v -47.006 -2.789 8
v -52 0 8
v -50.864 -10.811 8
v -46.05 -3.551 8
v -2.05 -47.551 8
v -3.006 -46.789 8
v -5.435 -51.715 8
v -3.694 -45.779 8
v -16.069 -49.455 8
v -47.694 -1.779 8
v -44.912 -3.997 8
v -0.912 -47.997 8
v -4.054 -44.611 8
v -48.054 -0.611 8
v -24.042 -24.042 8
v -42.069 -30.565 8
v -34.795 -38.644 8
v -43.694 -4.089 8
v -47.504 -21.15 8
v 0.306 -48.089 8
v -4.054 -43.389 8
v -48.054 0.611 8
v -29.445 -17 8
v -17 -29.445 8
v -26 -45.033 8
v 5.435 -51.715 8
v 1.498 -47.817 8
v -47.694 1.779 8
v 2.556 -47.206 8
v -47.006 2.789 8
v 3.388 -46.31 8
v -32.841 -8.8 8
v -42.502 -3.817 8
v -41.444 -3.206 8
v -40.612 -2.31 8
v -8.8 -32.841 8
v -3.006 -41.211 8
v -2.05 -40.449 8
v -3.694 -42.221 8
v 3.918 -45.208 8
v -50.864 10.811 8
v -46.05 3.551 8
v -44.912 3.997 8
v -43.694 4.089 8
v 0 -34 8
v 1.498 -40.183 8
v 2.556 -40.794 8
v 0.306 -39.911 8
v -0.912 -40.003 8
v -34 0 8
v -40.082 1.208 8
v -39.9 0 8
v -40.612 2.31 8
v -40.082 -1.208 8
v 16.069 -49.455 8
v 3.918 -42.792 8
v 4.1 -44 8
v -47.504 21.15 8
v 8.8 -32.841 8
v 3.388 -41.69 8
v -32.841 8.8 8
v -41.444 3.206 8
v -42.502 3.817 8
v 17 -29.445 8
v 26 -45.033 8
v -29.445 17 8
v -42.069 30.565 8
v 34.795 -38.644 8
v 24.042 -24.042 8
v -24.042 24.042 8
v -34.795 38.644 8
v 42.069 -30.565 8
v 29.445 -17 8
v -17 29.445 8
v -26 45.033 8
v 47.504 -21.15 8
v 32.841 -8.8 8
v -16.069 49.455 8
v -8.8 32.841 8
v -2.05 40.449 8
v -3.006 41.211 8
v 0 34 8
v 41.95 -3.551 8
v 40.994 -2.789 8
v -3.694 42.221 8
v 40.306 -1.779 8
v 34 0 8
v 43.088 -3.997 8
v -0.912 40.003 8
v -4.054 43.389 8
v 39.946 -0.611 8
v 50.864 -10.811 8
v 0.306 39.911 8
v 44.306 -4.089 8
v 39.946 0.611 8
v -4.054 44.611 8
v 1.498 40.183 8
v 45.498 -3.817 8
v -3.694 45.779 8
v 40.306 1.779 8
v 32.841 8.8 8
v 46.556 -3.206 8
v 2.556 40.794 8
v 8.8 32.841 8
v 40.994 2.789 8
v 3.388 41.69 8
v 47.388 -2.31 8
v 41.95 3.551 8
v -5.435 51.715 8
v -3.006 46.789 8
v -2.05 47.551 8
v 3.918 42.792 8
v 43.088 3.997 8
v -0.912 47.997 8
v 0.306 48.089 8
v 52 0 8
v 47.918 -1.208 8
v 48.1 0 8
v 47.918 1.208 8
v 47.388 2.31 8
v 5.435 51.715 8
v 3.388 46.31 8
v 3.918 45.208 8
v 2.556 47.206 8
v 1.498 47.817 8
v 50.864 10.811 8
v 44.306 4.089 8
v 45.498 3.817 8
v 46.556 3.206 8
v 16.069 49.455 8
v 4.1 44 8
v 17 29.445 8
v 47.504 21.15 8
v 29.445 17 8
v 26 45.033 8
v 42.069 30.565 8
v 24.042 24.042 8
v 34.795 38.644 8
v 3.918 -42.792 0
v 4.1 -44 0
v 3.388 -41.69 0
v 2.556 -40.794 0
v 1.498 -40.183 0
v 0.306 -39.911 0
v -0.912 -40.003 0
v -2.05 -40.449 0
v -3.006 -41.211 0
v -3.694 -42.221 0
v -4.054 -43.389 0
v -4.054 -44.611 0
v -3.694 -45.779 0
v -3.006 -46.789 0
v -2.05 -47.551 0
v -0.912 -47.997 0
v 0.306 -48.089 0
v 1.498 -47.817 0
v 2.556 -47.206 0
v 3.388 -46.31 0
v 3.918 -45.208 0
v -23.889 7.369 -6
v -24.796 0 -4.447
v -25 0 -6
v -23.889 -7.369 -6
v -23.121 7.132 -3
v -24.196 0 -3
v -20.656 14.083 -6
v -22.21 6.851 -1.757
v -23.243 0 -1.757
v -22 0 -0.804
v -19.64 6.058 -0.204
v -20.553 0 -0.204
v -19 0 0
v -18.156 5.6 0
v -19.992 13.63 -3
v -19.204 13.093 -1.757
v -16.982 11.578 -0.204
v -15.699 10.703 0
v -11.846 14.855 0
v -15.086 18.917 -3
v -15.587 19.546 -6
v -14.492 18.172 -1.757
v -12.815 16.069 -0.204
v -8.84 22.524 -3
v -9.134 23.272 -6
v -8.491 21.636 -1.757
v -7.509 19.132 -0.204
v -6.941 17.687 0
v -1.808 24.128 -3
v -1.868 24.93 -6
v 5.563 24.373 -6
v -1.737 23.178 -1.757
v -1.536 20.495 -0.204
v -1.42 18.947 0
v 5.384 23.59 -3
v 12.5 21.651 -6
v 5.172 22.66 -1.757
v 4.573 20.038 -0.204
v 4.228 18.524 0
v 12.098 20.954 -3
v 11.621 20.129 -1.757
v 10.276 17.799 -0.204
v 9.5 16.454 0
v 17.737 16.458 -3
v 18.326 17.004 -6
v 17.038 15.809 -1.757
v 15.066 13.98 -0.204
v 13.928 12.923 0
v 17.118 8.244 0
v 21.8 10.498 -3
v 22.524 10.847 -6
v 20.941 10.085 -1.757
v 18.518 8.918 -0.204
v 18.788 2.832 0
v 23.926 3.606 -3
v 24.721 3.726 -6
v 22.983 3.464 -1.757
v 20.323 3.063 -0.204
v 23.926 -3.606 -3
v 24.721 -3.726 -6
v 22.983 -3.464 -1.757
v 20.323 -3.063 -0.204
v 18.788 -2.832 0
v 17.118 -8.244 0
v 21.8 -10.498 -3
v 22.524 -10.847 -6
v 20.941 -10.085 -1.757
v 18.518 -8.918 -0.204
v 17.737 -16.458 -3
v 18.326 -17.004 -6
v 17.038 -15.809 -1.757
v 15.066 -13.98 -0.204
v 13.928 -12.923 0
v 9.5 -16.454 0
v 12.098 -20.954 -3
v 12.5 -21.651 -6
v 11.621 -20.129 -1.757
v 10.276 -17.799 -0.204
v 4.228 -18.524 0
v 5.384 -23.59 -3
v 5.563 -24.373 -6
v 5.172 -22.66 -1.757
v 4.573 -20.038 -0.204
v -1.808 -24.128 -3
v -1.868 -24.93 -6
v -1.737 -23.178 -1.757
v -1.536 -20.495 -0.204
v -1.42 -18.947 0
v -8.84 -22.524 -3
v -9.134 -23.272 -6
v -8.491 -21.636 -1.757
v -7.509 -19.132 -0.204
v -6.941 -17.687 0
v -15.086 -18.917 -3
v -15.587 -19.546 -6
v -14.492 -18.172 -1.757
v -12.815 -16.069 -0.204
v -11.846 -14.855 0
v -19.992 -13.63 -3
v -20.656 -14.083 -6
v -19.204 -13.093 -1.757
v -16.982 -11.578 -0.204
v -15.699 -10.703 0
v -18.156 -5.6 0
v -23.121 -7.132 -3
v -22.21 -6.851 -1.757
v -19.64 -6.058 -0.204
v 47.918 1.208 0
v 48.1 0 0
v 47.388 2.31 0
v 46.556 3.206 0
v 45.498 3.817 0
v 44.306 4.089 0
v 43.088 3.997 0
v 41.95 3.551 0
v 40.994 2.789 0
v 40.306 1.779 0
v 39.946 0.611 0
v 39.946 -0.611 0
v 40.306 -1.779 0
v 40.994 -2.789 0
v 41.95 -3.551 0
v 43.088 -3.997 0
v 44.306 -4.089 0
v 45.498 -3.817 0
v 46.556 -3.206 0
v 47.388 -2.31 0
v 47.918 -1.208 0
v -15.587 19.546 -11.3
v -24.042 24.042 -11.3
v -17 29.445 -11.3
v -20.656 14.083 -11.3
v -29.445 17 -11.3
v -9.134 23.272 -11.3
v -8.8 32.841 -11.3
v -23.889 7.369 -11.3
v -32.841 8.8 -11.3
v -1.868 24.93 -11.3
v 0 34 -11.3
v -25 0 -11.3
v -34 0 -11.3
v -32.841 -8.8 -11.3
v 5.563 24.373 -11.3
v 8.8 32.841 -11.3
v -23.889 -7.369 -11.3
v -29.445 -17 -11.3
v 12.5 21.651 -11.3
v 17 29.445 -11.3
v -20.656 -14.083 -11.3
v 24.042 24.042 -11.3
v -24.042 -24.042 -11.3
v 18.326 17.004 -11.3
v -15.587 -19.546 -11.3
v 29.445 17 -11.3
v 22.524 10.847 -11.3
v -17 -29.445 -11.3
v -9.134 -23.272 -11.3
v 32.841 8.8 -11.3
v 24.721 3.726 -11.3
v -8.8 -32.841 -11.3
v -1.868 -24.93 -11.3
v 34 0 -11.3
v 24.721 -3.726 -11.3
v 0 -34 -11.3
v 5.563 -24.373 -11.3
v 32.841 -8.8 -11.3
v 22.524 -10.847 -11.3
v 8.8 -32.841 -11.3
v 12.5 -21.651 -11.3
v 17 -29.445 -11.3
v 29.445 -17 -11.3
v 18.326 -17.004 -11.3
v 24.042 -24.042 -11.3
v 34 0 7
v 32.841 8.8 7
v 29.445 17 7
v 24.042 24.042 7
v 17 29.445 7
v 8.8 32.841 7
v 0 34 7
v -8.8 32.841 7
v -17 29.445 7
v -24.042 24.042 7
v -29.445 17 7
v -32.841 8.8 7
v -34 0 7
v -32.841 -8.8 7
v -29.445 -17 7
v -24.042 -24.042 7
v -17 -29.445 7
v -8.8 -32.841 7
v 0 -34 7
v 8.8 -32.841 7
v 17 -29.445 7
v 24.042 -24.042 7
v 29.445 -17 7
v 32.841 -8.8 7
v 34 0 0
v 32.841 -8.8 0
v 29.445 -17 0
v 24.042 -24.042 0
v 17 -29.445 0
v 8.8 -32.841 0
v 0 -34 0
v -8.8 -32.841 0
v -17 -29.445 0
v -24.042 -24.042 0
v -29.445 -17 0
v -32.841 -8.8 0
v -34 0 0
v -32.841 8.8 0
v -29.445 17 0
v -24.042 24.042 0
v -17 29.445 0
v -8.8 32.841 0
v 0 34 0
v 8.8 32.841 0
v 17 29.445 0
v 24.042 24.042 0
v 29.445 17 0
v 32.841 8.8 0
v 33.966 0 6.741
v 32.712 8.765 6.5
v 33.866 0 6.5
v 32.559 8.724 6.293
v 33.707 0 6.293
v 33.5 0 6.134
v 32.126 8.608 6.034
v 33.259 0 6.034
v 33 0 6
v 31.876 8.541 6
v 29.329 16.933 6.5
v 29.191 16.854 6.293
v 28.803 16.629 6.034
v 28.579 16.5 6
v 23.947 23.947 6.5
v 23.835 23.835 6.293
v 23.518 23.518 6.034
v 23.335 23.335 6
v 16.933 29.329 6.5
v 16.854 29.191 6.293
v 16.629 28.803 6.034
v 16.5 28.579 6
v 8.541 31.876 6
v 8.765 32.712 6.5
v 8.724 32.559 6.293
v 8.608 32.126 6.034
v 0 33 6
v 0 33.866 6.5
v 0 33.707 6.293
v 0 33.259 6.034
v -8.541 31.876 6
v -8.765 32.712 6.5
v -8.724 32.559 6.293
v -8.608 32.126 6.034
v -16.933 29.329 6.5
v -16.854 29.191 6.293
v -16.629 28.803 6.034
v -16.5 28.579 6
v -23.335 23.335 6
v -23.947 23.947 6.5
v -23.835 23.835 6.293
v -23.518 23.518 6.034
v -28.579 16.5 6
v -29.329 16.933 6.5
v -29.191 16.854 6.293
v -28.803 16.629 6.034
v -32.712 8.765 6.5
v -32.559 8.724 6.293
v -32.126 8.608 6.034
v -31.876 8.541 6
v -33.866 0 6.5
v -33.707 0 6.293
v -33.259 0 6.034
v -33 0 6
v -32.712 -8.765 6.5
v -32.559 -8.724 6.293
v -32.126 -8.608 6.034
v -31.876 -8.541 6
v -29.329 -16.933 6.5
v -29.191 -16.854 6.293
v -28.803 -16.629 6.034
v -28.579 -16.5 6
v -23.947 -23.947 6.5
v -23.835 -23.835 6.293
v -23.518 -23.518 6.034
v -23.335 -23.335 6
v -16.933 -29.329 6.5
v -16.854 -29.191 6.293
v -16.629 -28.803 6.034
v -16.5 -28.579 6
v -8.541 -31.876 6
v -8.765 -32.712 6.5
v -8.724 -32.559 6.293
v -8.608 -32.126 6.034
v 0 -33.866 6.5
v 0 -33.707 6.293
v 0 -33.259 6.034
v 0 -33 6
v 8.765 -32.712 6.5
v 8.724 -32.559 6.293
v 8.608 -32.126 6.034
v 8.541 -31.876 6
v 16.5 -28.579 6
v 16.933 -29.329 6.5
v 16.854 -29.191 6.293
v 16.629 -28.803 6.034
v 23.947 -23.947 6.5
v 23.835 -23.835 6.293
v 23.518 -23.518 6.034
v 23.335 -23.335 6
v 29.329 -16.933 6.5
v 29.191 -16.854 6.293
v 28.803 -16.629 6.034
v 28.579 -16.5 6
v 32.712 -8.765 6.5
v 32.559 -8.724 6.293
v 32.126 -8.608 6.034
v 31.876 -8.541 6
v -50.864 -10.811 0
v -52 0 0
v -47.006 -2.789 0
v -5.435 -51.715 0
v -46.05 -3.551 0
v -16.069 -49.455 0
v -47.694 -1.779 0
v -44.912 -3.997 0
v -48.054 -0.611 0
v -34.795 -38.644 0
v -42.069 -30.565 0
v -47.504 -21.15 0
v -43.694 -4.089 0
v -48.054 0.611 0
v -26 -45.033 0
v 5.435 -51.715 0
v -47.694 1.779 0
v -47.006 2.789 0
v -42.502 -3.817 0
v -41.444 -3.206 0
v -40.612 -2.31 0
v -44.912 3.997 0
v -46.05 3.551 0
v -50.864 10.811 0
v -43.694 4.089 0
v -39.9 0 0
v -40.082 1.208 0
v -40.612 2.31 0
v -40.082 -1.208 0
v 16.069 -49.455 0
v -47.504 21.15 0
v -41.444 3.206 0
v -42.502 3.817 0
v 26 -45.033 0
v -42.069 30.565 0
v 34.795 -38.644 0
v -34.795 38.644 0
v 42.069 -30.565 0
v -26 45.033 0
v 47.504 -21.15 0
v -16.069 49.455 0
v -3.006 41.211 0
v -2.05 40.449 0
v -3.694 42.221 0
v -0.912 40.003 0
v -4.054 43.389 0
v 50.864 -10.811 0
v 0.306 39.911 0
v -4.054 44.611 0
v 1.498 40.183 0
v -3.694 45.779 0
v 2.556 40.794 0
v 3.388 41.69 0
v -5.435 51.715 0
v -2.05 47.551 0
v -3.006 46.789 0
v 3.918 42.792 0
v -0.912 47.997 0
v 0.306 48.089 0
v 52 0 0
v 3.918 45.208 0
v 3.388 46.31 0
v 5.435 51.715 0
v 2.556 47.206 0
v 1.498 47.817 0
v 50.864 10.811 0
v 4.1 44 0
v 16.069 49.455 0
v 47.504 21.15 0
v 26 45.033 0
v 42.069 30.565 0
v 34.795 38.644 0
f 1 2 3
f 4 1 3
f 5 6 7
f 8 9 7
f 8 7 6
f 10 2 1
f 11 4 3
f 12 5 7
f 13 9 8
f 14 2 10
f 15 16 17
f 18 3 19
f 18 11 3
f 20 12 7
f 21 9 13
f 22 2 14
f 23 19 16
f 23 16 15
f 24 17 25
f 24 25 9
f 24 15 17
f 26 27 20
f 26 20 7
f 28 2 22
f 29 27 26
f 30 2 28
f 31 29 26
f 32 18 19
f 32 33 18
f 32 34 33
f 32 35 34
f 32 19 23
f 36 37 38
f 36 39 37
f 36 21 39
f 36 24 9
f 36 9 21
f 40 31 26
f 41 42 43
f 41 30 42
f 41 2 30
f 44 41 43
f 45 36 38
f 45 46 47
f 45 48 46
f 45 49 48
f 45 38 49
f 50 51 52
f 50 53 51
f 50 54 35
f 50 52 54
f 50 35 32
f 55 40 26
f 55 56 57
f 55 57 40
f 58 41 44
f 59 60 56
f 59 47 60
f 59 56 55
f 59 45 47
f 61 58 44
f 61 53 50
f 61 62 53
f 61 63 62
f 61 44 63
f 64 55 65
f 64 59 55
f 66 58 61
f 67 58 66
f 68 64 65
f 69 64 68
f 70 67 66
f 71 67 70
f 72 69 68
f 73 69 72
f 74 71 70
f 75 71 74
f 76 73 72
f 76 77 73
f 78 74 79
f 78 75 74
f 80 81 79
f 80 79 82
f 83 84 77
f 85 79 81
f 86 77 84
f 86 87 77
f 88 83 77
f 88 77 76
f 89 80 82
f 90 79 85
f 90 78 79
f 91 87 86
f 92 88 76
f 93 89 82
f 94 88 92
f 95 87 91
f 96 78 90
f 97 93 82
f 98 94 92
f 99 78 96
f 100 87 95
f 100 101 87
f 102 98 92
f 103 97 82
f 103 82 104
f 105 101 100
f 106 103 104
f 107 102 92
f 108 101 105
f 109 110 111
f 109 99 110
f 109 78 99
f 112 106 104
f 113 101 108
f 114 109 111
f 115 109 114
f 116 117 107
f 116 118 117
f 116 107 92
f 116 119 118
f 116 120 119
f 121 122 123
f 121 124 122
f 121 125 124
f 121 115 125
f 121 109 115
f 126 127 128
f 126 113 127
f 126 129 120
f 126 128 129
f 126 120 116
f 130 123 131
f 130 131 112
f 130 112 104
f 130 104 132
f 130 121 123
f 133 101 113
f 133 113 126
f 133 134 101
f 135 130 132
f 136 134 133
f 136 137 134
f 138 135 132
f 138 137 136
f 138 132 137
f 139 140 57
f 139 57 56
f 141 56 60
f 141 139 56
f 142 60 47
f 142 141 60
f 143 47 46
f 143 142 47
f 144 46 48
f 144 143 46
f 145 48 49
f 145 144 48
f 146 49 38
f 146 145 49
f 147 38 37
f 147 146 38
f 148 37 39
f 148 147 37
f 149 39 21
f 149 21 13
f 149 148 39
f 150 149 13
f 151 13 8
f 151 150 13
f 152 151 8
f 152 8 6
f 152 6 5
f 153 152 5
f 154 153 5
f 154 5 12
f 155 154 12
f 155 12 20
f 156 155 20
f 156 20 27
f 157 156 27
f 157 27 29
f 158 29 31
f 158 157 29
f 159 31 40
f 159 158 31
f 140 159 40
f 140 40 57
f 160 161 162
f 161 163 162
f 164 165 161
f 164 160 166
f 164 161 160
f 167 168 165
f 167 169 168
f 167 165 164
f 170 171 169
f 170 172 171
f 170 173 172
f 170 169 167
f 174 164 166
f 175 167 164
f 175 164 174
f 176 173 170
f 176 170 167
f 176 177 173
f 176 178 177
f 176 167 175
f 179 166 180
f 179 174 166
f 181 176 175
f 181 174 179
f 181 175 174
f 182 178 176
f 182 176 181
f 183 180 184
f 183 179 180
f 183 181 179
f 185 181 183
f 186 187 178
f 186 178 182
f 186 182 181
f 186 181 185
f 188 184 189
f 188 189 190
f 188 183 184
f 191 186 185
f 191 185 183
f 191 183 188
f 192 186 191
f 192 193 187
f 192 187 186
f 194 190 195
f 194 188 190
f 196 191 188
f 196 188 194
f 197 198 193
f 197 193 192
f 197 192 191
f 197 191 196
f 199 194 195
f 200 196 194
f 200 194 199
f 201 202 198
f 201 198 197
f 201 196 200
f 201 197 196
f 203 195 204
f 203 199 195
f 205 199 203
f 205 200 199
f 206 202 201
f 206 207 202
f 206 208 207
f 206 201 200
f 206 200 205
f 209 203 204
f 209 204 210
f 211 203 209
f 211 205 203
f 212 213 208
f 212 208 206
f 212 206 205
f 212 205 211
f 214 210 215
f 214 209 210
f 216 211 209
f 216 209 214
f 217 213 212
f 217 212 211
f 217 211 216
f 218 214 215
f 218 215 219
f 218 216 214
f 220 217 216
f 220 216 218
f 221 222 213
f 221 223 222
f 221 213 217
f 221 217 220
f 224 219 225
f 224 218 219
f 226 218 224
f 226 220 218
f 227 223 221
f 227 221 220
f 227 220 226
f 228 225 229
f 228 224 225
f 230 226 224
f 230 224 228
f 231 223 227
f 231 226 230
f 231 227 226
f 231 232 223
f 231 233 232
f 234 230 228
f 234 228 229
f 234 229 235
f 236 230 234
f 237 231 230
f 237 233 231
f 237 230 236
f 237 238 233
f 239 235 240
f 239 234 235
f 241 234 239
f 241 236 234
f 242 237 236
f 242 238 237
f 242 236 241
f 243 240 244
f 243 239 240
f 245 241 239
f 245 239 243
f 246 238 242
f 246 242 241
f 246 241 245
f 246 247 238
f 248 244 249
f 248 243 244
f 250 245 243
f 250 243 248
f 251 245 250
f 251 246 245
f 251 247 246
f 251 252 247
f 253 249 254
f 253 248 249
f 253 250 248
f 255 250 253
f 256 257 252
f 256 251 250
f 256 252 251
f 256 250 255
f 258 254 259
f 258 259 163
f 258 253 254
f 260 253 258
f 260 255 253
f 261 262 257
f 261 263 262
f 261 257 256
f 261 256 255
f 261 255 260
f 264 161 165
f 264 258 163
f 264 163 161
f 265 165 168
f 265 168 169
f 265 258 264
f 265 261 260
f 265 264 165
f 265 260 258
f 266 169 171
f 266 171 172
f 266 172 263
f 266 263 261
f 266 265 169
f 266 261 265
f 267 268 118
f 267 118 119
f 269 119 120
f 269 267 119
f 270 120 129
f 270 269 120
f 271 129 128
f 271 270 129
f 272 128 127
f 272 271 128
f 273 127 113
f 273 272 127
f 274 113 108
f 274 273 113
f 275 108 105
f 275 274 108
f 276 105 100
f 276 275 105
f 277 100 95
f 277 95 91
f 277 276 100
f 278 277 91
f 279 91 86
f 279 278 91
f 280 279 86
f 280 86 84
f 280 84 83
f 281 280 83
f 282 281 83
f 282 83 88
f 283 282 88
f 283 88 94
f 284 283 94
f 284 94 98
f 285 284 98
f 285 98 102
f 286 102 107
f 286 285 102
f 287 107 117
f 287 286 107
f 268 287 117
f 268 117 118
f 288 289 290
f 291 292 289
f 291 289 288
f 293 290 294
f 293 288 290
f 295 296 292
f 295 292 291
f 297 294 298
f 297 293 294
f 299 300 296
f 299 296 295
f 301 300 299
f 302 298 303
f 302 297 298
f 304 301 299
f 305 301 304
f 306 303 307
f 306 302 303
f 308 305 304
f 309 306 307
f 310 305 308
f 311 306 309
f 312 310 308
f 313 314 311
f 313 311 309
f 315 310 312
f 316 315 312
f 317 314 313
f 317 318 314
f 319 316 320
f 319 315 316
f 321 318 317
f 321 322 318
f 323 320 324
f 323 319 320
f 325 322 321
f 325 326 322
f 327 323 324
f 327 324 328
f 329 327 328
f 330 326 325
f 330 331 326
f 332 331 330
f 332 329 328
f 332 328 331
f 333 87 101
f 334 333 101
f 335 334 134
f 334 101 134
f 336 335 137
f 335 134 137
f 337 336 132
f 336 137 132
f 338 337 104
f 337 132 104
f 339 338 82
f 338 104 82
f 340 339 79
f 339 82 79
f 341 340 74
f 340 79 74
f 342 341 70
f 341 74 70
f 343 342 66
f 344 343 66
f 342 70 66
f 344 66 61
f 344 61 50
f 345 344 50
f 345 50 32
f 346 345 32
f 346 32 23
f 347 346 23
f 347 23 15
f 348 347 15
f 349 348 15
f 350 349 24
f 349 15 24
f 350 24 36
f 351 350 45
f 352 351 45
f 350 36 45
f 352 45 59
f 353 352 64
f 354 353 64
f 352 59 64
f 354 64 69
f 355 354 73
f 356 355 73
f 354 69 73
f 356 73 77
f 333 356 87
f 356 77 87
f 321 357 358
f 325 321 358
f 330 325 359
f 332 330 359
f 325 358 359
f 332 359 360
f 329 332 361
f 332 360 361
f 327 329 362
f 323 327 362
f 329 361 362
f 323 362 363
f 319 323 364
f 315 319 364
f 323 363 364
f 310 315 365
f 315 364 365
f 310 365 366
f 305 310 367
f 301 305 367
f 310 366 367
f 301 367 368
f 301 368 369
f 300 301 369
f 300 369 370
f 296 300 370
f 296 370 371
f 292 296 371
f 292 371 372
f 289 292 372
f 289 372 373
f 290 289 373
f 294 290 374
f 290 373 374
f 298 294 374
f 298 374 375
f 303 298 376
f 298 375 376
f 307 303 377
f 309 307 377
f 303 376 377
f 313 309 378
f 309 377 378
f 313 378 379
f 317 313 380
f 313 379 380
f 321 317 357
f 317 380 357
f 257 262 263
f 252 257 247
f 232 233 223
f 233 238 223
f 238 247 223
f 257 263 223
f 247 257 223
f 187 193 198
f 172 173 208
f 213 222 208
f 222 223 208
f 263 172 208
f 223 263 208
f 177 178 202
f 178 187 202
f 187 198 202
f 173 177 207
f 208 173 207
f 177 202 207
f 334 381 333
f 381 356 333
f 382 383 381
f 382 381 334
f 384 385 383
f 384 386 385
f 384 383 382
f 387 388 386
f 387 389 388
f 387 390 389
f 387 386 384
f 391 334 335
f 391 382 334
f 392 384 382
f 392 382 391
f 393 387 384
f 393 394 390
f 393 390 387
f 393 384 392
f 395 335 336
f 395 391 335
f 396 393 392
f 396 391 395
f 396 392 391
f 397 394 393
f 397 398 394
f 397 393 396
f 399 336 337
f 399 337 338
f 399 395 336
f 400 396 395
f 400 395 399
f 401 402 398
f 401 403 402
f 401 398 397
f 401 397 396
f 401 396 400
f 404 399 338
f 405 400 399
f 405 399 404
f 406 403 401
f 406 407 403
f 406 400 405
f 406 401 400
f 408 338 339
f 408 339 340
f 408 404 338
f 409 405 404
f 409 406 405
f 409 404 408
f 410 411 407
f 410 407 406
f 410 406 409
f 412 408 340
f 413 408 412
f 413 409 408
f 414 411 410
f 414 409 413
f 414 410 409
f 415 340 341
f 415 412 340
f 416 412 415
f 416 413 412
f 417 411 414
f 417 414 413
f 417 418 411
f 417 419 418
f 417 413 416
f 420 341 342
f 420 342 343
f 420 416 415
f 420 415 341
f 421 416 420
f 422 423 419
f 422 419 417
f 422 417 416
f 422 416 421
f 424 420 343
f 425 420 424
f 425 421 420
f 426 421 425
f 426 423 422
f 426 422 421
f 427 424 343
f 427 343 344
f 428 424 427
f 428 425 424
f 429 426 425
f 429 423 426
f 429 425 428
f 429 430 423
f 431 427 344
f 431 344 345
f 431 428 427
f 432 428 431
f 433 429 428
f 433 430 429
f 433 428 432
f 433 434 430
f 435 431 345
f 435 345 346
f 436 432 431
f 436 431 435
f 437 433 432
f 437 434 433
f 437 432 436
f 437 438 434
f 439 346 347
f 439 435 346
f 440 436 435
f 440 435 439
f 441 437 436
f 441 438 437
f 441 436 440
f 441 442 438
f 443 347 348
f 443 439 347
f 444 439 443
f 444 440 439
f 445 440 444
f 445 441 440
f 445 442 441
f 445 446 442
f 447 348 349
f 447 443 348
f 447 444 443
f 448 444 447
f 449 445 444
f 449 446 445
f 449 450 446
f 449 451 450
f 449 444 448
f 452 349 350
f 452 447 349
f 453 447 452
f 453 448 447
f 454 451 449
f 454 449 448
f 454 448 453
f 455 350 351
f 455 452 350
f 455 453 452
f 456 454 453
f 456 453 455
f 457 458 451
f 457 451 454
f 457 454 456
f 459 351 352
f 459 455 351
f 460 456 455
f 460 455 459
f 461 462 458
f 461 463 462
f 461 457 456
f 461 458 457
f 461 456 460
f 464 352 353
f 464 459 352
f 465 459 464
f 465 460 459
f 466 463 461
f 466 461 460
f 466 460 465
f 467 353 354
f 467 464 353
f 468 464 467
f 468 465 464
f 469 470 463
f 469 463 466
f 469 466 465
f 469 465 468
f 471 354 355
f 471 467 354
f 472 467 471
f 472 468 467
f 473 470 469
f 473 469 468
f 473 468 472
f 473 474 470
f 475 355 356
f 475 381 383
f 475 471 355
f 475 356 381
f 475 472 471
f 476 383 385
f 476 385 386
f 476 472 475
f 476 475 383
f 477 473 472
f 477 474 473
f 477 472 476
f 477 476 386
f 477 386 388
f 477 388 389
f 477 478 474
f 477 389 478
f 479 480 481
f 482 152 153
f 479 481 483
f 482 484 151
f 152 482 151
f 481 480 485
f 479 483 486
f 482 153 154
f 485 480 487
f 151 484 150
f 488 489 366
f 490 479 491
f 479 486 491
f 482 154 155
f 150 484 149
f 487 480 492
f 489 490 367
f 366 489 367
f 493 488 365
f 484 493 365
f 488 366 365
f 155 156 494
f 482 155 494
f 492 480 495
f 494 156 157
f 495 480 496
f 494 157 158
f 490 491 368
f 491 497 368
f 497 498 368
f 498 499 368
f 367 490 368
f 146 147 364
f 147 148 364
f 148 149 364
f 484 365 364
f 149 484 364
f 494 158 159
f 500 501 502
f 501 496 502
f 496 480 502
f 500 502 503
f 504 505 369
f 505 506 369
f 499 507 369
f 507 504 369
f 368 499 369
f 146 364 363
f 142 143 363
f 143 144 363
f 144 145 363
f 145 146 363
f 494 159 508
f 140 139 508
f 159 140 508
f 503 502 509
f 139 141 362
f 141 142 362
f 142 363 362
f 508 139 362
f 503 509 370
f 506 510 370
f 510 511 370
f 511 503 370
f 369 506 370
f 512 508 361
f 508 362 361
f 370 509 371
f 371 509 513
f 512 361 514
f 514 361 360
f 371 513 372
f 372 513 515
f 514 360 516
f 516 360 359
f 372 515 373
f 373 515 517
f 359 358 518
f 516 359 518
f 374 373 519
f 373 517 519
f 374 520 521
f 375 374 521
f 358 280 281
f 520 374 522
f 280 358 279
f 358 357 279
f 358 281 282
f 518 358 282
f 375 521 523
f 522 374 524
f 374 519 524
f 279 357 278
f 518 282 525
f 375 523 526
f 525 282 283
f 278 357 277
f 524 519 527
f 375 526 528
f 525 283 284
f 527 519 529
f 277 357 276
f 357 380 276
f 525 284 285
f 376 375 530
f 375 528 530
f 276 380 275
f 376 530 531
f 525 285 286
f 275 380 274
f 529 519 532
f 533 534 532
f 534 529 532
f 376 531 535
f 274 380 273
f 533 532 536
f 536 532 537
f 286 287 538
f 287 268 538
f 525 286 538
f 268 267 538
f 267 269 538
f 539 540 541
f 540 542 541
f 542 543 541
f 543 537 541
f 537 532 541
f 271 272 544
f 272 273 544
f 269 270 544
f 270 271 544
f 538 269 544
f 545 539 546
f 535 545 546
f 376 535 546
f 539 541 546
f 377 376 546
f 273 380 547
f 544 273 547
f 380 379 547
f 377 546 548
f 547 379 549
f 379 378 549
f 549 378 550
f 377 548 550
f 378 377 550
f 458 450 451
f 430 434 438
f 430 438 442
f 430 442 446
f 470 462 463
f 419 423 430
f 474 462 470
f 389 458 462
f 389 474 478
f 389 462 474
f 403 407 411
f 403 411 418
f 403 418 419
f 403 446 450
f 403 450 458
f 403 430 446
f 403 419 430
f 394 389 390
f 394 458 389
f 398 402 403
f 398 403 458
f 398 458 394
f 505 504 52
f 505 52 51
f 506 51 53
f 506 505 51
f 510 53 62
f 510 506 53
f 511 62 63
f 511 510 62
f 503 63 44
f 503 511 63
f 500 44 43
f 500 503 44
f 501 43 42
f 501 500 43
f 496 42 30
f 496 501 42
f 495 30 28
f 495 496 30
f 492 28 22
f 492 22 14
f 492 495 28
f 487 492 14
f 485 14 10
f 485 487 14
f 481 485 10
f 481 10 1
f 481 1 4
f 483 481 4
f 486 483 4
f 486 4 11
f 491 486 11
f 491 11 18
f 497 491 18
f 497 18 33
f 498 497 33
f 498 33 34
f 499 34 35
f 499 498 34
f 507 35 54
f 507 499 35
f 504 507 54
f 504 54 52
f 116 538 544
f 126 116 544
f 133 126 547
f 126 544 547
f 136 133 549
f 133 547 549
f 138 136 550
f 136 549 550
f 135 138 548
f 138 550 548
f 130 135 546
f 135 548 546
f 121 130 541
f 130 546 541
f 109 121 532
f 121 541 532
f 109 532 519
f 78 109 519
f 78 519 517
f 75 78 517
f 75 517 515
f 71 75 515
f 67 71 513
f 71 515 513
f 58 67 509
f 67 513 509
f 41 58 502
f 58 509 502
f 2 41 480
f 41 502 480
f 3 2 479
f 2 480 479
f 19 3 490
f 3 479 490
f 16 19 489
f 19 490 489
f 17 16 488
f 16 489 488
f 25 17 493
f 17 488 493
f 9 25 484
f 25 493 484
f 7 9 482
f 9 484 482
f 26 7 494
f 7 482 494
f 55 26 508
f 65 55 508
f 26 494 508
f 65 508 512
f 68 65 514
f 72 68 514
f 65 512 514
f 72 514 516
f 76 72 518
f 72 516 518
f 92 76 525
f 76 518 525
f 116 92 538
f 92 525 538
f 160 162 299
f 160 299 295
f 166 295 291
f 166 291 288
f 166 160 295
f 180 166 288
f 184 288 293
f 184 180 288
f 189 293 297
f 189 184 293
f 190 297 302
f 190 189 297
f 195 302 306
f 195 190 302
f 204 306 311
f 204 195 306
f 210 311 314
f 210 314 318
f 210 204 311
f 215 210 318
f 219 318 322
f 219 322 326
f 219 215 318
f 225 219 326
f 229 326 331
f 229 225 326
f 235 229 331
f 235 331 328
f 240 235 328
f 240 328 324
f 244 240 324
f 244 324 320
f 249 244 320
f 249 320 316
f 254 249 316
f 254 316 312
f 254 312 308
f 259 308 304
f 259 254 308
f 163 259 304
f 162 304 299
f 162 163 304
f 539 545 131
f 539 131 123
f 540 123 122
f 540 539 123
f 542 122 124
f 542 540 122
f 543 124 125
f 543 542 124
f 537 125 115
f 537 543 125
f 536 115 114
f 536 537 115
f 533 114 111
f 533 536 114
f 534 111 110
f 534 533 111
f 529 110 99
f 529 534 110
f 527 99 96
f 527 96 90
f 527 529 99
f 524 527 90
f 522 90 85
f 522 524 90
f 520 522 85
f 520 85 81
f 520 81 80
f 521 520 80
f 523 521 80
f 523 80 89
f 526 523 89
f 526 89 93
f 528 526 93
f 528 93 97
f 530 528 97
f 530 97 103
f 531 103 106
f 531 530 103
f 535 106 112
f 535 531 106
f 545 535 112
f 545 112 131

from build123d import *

# Parameters (mm, degrees)
SKETCH_1_R          = 52
SKETCH_1_R_2        = 4.1
EXTRUDE_1_DEPTH     = 8
SKETCH_2_R          = 34
CUT_EXTRUDE_1_DEPTH = 2
FILLET_1_R          = 1
SKETCH_3_R          = 34
SKETCH_3_R_2        = 25
EXTRUDE_2_DEPTH     = 11.3
FILLET_2_R          = 6


with BuildPart() as part:
    # Эскиз1 → Бобышка-Вытянуть1 (new body)
    with BuildSketch(Plane.XY):
        Circle(SKETCH_1_R)
        with Locations((0, 44)):
            Circle(SKETCH_1_R_2, mode=Mode.SUBTRACT)
        with Locations((44, 0)):
            Circle(SKETCH_1_R_2, mode=Mode.SUBTRACT)
        with Locations((0, -44)):
            Circle(SKETCH_1_R_2, mode=Mode.SUBTRACT)
        with Locations((-44, 0)):
            Circle(SKETCH_1_R_2, mode=Mode.SUBTRACT)
    extrude(amount=EXTRUDE_1_DEPTH)

    # Эскиз2 → Вырез-Вытянуть1 (cut)
    with BuildSketch(Plane.XY.offset(8)):
        Circle(SKETCH_2_R)
    extrude(amount=-CUT_EXTRUDE_1_DEPTH, mode=Mode.SUBTRACT)

    # Скругление1
    fillet_1_edges = [part.edges().sort_by_distance(p)[0] for p in [
        (-34, 0, 6),
    ]]
    fillet(fillet_1_edges, radius=FILLET_1_R)

    # Эскиз3 → Бобышка-Вытянуть2 (add)
    with BuildSketch(Plane(origin=(0, 0, 0), x_dir=(-1, 0, 0), z_dir=(0, 0, -1))):
        with Locations(Location((0, 0, 0), (0, 0, 180))):
            Circle(SKETCH_3_R)
        Circle(SKETCH_3_R_2, mode=Mode.SUBTRACT)
    extrude(amount=EXTRUDE_2_DEPTH)

    # Скругление2
    fillet_2_edges = [part.edges().sort_by_distance(p)[0] for p in [
        (25, 0, 0),
    ]]
    fillet(fillet_2_edges, radius=FILLET_2_R)


solid = part.part
